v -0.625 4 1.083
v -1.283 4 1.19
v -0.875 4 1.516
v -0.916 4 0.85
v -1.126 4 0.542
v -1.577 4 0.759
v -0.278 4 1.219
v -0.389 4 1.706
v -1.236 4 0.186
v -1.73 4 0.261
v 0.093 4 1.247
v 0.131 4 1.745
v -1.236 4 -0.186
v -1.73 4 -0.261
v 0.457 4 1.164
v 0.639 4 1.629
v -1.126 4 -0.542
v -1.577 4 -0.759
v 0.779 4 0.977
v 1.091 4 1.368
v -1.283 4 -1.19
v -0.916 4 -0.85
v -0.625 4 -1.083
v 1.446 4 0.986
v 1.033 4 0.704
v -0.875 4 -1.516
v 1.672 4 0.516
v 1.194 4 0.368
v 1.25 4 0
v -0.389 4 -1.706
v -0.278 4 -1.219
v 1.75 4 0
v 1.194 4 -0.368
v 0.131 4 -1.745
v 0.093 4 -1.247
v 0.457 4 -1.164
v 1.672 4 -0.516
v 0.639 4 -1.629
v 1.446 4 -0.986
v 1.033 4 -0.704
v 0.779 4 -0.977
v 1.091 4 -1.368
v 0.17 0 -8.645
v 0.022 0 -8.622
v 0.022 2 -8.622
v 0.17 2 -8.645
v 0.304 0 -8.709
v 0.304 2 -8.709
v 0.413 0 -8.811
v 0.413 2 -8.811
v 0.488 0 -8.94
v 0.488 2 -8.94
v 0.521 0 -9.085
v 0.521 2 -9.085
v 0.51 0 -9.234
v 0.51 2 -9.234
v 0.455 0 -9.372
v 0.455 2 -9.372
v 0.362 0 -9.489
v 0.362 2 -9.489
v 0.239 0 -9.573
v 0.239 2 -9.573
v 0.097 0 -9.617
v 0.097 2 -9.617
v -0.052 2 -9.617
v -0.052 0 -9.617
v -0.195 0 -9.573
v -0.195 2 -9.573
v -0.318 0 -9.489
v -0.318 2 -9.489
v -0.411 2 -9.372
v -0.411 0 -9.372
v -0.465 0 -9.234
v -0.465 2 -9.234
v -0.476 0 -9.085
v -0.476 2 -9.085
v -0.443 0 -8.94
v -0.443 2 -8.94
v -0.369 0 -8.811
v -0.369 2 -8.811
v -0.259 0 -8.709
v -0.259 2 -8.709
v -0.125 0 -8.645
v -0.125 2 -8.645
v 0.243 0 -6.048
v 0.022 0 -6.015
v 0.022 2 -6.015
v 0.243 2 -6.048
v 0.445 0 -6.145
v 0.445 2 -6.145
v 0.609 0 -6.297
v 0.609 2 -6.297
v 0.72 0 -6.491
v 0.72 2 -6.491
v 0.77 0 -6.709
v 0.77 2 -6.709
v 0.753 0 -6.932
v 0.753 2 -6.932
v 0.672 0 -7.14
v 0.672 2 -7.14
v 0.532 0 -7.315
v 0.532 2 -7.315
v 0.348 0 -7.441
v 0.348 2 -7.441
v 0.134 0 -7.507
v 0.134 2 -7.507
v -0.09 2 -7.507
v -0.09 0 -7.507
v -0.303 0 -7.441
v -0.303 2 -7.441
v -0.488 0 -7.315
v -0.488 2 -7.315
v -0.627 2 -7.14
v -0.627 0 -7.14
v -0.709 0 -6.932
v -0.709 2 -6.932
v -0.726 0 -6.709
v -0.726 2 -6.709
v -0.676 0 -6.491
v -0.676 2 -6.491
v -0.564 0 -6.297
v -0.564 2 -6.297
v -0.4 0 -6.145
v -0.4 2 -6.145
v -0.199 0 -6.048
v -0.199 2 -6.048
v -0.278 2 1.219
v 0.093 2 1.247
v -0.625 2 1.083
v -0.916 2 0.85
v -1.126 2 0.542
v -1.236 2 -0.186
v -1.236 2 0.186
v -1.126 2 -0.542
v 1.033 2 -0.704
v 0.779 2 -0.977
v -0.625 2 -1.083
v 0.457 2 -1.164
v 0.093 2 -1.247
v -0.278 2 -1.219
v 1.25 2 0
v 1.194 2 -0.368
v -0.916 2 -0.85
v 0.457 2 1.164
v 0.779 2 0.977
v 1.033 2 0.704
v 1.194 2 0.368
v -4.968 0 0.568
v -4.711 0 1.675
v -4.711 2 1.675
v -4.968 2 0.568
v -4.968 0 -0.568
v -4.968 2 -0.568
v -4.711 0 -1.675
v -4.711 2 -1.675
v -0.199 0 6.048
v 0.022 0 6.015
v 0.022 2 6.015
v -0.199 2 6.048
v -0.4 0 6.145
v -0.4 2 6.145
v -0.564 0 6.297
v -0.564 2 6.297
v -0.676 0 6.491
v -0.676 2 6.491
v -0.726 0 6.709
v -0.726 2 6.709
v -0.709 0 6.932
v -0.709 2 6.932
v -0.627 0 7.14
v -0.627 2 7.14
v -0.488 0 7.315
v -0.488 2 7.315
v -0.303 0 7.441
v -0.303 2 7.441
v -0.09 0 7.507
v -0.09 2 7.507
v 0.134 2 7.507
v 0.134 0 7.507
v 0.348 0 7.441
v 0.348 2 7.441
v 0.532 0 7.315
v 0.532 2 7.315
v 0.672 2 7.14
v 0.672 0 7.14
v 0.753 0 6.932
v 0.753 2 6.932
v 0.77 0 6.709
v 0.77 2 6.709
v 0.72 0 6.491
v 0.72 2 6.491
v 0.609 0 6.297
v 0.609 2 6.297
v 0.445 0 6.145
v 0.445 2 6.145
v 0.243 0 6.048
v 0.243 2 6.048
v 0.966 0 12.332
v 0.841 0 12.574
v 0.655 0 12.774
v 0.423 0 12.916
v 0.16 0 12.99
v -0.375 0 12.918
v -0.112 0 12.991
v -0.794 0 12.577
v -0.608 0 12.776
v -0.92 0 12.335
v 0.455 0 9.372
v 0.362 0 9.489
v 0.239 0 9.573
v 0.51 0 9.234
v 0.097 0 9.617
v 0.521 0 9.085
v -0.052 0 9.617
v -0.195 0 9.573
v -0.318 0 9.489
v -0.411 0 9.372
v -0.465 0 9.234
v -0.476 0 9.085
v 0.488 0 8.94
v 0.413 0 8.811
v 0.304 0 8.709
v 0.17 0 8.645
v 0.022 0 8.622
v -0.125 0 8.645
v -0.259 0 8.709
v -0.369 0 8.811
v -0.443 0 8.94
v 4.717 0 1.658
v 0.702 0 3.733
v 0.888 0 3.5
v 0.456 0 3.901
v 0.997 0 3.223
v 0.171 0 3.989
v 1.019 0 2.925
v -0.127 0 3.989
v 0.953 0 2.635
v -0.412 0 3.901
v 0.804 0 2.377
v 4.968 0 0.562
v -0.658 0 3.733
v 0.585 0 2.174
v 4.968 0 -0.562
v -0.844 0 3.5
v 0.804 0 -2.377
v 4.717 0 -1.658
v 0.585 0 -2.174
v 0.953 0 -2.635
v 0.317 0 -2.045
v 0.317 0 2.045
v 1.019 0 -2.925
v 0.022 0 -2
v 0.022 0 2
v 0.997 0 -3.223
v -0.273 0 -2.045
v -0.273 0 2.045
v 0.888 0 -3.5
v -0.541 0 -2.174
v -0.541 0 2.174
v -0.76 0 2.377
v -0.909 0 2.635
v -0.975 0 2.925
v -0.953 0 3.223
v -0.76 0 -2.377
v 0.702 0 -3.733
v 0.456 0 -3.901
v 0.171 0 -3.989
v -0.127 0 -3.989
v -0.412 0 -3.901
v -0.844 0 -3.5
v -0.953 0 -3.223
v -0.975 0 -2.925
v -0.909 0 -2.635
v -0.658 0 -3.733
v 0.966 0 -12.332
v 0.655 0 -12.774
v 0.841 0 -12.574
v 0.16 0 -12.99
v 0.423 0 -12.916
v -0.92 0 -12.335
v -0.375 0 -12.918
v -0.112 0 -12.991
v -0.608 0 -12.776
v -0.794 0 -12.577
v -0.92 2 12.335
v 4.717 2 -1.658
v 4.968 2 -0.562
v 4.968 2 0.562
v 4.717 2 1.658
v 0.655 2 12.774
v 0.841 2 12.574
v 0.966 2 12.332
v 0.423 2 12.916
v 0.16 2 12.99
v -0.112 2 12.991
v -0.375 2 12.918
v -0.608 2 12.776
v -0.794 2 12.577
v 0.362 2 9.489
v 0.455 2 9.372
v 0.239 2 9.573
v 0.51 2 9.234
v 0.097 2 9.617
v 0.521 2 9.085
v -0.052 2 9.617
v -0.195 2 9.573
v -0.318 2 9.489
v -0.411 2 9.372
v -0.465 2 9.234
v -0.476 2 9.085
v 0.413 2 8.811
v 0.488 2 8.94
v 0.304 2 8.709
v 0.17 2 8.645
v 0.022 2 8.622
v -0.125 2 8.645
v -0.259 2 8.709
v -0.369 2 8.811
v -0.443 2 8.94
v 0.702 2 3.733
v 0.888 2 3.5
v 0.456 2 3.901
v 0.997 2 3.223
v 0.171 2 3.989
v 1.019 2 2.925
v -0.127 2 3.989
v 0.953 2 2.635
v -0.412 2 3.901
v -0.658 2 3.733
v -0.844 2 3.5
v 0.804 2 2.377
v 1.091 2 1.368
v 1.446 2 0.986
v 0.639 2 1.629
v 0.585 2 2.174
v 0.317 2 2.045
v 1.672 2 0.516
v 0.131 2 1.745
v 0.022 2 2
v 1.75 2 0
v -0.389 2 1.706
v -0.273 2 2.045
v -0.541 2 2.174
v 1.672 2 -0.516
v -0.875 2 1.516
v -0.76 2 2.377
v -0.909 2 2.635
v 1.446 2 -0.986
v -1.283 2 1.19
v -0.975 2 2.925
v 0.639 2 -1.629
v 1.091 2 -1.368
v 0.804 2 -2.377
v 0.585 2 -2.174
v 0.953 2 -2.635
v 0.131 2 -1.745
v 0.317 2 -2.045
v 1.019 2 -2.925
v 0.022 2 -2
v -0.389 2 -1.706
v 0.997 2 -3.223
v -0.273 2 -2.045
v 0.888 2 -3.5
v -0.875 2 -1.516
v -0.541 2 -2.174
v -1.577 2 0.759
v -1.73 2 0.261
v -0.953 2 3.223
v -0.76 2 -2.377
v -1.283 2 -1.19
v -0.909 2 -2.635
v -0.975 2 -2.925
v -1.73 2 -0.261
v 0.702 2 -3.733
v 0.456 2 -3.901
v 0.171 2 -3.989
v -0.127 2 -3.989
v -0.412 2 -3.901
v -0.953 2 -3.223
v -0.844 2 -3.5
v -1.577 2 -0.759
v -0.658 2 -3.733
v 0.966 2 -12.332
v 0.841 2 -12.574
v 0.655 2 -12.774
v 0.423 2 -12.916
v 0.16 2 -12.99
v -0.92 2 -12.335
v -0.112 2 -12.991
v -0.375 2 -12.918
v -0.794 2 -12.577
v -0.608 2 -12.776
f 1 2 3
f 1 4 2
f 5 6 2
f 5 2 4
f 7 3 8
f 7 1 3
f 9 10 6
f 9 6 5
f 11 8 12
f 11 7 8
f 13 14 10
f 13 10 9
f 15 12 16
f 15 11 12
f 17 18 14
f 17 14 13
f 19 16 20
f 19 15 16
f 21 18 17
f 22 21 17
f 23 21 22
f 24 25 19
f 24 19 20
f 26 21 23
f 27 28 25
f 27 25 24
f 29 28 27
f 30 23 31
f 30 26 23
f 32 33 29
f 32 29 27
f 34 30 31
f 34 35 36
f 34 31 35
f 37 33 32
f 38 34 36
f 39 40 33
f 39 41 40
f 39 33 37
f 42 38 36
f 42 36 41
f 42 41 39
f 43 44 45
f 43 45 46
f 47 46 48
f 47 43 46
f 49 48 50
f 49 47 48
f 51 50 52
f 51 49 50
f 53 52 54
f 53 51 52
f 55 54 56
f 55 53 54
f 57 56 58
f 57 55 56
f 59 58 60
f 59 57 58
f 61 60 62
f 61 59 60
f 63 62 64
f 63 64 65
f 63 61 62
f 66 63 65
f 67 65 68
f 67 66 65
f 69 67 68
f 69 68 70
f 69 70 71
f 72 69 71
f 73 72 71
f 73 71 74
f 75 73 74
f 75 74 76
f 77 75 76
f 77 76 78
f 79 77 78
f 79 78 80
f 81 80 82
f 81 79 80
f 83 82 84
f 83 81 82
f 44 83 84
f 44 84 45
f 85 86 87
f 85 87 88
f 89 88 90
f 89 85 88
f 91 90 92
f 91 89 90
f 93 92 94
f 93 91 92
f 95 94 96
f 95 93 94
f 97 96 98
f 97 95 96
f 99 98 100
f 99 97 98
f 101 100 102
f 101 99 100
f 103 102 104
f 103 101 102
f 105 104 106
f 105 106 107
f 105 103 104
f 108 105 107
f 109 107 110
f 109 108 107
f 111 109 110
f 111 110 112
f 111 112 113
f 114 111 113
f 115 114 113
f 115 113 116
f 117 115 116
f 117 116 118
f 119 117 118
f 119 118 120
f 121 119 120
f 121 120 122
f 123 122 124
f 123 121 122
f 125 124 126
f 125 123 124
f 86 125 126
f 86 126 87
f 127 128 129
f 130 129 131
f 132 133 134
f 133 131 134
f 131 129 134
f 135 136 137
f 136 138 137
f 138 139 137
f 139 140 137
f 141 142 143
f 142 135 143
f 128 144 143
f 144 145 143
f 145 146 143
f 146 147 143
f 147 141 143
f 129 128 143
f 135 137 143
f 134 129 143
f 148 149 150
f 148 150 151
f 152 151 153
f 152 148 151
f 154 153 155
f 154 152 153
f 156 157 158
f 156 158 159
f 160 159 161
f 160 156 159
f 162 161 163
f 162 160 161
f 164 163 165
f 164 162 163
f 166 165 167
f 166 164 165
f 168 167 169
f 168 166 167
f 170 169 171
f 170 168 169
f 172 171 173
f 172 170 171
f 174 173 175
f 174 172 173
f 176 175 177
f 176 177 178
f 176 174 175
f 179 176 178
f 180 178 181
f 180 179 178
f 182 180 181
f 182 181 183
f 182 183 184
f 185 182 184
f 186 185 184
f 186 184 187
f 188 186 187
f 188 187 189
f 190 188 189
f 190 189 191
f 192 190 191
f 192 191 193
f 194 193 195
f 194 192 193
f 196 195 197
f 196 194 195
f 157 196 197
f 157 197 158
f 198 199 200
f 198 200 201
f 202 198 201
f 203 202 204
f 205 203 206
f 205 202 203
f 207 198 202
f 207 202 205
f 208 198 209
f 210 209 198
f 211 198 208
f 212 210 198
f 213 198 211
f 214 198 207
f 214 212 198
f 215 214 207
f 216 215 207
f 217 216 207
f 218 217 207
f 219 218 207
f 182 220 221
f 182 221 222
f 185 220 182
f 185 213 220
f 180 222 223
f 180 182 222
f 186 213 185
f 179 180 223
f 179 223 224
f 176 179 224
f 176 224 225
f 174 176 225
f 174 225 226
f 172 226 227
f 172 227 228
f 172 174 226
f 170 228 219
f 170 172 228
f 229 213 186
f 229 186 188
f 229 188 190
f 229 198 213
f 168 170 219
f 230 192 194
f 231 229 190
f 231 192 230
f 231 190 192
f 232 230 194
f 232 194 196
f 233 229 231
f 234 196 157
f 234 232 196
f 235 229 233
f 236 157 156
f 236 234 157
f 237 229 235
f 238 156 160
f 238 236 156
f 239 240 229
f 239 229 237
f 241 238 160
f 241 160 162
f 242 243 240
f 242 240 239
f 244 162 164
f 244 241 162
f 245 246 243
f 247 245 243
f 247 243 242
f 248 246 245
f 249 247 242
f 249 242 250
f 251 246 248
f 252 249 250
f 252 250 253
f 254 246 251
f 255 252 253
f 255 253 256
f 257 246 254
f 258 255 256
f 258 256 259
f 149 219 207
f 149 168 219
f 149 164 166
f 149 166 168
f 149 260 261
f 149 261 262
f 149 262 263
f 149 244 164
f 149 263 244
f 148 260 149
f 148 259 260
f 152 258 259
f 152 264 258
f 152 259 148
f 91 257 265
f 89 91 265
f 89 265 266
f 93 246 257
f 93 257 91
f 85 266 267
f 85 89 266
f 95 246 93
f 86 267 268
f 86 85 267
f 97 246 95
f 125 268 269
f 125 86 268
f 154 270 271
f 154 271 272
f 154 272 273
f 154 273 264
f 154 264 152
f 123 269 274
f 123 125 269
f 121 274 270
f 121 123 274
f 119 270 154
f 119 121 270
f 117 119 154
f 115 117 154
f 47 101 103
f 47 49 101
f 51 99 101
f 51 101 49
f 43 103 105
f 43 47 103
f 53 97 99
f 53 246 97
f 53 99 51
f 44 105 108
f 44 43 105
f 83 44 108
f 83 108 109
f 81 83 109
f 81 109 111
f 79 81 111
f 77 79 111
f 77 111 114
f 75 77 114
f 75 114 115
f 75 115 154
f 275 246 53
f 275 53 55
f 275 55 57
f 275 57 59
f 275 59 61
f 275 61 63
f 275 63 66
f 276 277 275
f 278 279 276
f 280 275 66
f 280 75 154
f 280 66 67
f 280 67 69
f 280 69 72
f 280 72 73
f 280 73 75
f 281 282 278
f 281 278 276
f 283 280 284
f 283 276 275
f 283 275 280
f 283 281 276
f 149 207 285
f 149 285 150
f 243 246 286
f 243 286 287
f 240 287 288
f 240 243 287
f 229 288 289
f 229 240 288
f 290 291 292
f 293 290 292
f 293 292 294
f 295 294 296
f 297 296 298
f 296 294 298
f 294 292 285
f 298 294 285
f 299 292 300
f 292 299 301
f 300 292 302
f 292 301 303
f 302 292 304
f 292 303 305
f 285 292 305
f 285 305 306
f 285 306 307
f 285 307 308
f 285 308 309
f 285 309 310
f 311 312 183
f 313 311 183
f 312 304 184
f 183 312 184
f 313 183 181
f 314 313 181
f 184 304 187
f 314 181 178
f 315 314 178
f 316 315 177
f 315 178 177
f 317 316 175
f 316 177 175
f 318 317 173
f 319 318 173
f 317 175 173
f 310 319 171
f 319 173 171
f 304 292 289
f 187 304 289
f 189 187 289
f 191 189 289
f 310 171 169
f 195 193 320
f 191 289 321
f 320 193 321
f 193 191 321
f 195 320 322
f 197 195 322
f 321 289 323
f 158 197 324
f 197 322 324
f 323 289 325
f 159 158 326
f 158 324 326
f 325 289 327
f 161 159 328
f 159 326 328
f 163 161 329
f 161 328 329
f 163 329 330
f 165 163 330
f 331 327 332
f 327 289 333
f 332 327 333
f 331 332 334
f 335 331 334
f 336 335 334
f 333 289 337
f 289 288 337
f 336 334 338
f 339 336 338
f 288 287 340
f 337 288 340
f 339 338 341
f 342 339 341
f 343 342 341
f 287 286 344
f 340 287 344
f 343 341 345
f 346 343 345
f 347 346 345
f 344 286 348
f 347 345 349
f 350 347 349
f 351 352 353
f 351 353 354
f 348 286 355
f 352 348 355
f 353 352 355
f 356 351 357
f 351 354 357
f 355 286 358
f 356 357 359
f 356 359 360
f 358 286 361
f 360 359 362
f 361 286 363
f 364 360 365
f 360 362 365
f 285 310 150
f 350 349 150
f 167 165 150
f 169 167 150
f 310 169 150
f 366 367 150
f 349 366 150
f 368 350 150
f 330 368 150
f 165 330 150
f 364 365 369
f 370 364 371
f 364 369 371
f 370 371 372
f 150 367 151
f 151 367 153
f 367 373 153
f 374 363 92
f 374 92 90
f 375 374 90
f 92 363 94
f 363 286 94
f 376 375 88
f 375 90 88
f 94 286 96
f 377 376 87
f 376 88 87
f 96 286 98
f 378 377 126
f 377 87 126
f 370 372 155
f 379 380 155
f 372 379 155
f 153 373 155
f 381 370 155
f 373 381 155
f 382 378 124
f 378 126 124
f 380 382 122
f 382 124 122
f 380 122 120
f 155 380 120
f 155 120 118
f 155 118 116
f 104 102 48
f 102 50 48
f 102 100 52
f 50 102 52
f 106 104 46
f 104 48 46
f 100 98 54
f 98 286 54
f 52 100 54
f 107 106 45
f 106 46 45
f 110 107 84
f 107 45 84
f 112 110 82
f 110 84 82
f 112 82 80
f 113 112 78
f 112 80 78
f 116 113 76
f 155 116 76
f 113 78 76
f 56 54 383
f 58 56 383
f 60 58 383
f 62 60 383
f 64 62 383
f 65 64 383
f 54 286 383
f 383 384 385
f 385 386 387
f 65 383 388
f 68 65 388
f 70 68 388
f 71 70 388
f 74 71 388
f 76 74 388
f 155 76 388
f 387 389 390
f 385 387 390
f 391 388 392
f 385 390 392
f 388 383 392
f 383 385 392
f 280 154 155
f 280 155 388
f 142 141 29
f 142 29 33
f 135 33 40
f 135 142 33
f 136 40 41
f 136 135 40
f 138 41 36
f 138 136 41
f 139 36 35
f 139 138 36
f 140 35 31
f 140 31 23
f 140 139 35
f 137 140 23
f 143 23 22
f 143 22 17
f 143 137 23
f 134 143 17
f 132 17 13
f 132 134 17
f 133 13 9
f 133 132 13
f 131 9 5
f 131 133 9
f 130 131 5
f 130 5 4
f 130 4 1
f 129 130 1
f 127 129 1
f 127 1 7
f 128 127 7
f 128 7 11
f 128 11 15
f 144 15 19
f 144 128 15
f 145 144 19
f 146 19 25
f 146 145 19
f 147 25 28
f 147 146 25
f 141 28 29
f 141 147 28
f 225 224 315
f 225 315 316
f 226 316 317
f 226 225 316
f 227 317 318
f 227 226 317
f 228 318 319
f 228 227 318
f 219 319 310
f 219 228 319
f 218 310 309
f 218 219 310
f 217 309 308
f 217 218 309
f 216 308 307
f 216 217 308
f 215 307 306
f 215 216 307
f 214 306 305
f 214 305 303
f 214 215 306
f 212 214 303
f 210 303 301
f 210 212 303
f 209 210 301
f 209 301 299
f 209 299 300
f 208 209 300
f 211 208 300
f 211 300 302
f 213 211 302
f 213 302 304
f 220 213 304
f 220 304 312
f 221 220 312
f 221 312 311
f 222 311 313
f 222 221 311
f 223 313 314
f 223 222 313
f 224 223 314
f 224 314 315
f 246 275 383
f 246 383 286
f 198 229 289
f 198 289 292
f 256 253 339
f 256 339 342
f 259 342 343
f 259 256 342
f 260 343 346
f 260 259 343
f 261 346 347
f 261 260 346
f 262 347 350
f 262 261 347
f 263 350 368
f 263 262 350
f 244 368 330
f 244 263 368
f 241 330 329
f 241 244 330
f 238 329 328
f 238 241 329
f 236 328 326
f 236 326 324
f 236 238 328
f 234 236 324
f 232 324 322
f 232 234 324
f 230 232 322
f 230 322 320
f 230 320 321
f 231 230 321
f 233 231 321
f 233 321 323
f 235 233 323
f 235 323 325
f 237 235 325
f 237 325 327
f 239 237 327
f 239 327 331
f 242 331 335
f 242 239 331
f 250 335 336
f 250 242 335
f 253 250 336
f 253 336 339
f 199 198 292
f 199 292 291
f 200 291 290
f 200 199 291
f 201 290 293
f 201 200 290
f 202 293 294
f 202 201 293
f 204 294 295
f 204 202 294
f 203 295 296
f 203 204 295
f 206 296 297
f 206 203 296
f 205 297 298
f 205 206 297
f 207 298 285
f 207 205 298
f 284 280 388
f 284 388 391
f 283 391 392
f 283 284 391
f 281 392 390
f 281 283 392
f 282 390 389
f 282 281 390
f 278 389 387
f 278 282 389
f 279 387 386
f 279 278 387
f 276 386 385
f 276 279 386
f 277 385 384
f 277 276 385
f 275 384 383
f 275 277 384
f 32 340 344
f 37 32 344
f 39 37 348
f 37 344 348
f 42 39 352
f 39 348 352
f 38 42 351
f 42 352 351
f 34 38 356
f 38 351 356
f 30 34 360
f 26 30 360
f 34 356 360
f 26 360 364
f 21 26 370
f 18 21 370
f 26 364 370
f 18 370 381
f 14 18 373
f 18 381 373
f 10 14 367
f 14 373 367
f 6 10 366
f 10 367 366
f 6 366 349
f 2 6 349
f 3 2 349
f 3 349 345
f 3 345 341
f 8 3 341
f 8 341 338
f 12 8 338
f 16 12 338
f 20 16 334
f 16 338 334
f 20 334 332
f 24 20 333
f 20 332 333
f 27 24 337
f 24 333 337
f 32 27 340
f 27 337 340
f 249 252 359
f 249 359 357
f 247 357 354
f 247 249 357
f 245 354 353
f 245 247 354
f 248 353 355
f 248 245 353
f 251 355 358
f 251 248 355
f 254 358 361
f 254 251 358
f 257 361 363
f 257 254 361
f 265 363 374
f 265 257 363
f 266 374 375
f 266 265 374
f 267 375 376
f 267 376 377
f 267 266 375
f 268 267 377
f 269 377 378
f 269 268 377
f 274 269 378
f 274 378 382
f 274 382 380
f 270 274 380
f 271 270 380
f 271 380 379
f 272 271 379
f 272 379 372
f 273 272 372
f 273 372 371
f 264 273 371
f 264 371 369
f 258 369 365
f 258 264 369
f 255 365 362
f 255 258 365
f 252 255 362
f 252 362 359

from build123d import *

# Parameters (mm, degrees)
SKETCH1_R           = 0.5
SKETCH1_R_2         = 0.75
SKETCH1_R_3         = 1
BOSS_EXTRUDE1_DEPTH = 2
SKETCH2_R           = 1.75
SKETCH2_R_2         = 1.25
EXTRUDE_THIN1_DEPTH = 2


with BuildPart() as part:
    # Sketch1 → Boss-Extrude1 (new body)
    with BuildSketch(Plane(origin=(0, 0, 0), x_dir=(1, 0, 0), z_dir=(0, 1, 0))):
        with BuildLine():
            Line((-4.710957819, 1.675373519), (-0.920020296, 12.335054222))
            ThreePointArc((-0.920020296, 12.335054222), (0.024018874, 12.999977811), (0.965594569, 12.331570343))
            Line((0.965594569, 12.331570343), (4.717116505, 1.657954125))
            ThreePointArc((4.717116505, 1.657954125), (5, 0), (4.717116505, -1.657954125))
            Line((4.717116505, -1.657954125), (0.965594569, -12.331570343))
            ThreePointArc((0.965594569, -12.331570343), (0.024018874, -12.999977811), (-0.920020296, -12.335054222))
            Line((-0.920020296, -12.335054222), (-4.710957819, -1.675373519))
            ThreePointArc((-4.710957819, -1.675373519), (-5, 0), (-4.710957819, 1.675373519))
        make_face()
        with Locations(Location((0.022171268, 9.122391825, 0), (0, 0, 270))):
            Circle(SKETCH1_R, mode=Mode.SUBTRACT)
        with Locations(Location((0.022171268, 6.764981493, 0), (0, 0, 270))):
            Circle(SKETCH1_R_2, mode=Mode.SUBTRACT)
        with Locations(Location((0.022171268, 3.000162006, 0), (0, 0, 270))):
            Circle(SKETCH1_R_3, mode=Mode.SUBTRACT)
        with Locations(Location((0.022171268, -9.122391825, 0), (0, 0, 90))):
            Circle(SKETCH1_R, mode=Mode.SUBTRACT)
        with Locations(Location((0.022171268, -6.764981493, 0), (0, 0, 90))):
            Circle(SKETCH1_R_2, mode=Mode.SUBTRACT)
        with Locations(Location((0.022171268, -3.000162006, 0), (0, 0, 90))):
            Circle(SKETCH1_R_3, mode=Mode.SUBTRACT)
    extrude(amount=BOSS_EXTRUDE1_DEPTH)

    # Sketch2 → Extrude-Thin1 (add)
    with BuildSketch(Plane(origin=(0, 2, 0), x_dir=(1, 0, 0), z_dir=(0, 1, 0))):
        Circle(SKETCH2_R)
        Circle(SKETCH2_R_2, mode=Mode.SUBTRACT)
    extrude(amount=EXTRUDE_THIN1_DEPTH)


solid = part.part
